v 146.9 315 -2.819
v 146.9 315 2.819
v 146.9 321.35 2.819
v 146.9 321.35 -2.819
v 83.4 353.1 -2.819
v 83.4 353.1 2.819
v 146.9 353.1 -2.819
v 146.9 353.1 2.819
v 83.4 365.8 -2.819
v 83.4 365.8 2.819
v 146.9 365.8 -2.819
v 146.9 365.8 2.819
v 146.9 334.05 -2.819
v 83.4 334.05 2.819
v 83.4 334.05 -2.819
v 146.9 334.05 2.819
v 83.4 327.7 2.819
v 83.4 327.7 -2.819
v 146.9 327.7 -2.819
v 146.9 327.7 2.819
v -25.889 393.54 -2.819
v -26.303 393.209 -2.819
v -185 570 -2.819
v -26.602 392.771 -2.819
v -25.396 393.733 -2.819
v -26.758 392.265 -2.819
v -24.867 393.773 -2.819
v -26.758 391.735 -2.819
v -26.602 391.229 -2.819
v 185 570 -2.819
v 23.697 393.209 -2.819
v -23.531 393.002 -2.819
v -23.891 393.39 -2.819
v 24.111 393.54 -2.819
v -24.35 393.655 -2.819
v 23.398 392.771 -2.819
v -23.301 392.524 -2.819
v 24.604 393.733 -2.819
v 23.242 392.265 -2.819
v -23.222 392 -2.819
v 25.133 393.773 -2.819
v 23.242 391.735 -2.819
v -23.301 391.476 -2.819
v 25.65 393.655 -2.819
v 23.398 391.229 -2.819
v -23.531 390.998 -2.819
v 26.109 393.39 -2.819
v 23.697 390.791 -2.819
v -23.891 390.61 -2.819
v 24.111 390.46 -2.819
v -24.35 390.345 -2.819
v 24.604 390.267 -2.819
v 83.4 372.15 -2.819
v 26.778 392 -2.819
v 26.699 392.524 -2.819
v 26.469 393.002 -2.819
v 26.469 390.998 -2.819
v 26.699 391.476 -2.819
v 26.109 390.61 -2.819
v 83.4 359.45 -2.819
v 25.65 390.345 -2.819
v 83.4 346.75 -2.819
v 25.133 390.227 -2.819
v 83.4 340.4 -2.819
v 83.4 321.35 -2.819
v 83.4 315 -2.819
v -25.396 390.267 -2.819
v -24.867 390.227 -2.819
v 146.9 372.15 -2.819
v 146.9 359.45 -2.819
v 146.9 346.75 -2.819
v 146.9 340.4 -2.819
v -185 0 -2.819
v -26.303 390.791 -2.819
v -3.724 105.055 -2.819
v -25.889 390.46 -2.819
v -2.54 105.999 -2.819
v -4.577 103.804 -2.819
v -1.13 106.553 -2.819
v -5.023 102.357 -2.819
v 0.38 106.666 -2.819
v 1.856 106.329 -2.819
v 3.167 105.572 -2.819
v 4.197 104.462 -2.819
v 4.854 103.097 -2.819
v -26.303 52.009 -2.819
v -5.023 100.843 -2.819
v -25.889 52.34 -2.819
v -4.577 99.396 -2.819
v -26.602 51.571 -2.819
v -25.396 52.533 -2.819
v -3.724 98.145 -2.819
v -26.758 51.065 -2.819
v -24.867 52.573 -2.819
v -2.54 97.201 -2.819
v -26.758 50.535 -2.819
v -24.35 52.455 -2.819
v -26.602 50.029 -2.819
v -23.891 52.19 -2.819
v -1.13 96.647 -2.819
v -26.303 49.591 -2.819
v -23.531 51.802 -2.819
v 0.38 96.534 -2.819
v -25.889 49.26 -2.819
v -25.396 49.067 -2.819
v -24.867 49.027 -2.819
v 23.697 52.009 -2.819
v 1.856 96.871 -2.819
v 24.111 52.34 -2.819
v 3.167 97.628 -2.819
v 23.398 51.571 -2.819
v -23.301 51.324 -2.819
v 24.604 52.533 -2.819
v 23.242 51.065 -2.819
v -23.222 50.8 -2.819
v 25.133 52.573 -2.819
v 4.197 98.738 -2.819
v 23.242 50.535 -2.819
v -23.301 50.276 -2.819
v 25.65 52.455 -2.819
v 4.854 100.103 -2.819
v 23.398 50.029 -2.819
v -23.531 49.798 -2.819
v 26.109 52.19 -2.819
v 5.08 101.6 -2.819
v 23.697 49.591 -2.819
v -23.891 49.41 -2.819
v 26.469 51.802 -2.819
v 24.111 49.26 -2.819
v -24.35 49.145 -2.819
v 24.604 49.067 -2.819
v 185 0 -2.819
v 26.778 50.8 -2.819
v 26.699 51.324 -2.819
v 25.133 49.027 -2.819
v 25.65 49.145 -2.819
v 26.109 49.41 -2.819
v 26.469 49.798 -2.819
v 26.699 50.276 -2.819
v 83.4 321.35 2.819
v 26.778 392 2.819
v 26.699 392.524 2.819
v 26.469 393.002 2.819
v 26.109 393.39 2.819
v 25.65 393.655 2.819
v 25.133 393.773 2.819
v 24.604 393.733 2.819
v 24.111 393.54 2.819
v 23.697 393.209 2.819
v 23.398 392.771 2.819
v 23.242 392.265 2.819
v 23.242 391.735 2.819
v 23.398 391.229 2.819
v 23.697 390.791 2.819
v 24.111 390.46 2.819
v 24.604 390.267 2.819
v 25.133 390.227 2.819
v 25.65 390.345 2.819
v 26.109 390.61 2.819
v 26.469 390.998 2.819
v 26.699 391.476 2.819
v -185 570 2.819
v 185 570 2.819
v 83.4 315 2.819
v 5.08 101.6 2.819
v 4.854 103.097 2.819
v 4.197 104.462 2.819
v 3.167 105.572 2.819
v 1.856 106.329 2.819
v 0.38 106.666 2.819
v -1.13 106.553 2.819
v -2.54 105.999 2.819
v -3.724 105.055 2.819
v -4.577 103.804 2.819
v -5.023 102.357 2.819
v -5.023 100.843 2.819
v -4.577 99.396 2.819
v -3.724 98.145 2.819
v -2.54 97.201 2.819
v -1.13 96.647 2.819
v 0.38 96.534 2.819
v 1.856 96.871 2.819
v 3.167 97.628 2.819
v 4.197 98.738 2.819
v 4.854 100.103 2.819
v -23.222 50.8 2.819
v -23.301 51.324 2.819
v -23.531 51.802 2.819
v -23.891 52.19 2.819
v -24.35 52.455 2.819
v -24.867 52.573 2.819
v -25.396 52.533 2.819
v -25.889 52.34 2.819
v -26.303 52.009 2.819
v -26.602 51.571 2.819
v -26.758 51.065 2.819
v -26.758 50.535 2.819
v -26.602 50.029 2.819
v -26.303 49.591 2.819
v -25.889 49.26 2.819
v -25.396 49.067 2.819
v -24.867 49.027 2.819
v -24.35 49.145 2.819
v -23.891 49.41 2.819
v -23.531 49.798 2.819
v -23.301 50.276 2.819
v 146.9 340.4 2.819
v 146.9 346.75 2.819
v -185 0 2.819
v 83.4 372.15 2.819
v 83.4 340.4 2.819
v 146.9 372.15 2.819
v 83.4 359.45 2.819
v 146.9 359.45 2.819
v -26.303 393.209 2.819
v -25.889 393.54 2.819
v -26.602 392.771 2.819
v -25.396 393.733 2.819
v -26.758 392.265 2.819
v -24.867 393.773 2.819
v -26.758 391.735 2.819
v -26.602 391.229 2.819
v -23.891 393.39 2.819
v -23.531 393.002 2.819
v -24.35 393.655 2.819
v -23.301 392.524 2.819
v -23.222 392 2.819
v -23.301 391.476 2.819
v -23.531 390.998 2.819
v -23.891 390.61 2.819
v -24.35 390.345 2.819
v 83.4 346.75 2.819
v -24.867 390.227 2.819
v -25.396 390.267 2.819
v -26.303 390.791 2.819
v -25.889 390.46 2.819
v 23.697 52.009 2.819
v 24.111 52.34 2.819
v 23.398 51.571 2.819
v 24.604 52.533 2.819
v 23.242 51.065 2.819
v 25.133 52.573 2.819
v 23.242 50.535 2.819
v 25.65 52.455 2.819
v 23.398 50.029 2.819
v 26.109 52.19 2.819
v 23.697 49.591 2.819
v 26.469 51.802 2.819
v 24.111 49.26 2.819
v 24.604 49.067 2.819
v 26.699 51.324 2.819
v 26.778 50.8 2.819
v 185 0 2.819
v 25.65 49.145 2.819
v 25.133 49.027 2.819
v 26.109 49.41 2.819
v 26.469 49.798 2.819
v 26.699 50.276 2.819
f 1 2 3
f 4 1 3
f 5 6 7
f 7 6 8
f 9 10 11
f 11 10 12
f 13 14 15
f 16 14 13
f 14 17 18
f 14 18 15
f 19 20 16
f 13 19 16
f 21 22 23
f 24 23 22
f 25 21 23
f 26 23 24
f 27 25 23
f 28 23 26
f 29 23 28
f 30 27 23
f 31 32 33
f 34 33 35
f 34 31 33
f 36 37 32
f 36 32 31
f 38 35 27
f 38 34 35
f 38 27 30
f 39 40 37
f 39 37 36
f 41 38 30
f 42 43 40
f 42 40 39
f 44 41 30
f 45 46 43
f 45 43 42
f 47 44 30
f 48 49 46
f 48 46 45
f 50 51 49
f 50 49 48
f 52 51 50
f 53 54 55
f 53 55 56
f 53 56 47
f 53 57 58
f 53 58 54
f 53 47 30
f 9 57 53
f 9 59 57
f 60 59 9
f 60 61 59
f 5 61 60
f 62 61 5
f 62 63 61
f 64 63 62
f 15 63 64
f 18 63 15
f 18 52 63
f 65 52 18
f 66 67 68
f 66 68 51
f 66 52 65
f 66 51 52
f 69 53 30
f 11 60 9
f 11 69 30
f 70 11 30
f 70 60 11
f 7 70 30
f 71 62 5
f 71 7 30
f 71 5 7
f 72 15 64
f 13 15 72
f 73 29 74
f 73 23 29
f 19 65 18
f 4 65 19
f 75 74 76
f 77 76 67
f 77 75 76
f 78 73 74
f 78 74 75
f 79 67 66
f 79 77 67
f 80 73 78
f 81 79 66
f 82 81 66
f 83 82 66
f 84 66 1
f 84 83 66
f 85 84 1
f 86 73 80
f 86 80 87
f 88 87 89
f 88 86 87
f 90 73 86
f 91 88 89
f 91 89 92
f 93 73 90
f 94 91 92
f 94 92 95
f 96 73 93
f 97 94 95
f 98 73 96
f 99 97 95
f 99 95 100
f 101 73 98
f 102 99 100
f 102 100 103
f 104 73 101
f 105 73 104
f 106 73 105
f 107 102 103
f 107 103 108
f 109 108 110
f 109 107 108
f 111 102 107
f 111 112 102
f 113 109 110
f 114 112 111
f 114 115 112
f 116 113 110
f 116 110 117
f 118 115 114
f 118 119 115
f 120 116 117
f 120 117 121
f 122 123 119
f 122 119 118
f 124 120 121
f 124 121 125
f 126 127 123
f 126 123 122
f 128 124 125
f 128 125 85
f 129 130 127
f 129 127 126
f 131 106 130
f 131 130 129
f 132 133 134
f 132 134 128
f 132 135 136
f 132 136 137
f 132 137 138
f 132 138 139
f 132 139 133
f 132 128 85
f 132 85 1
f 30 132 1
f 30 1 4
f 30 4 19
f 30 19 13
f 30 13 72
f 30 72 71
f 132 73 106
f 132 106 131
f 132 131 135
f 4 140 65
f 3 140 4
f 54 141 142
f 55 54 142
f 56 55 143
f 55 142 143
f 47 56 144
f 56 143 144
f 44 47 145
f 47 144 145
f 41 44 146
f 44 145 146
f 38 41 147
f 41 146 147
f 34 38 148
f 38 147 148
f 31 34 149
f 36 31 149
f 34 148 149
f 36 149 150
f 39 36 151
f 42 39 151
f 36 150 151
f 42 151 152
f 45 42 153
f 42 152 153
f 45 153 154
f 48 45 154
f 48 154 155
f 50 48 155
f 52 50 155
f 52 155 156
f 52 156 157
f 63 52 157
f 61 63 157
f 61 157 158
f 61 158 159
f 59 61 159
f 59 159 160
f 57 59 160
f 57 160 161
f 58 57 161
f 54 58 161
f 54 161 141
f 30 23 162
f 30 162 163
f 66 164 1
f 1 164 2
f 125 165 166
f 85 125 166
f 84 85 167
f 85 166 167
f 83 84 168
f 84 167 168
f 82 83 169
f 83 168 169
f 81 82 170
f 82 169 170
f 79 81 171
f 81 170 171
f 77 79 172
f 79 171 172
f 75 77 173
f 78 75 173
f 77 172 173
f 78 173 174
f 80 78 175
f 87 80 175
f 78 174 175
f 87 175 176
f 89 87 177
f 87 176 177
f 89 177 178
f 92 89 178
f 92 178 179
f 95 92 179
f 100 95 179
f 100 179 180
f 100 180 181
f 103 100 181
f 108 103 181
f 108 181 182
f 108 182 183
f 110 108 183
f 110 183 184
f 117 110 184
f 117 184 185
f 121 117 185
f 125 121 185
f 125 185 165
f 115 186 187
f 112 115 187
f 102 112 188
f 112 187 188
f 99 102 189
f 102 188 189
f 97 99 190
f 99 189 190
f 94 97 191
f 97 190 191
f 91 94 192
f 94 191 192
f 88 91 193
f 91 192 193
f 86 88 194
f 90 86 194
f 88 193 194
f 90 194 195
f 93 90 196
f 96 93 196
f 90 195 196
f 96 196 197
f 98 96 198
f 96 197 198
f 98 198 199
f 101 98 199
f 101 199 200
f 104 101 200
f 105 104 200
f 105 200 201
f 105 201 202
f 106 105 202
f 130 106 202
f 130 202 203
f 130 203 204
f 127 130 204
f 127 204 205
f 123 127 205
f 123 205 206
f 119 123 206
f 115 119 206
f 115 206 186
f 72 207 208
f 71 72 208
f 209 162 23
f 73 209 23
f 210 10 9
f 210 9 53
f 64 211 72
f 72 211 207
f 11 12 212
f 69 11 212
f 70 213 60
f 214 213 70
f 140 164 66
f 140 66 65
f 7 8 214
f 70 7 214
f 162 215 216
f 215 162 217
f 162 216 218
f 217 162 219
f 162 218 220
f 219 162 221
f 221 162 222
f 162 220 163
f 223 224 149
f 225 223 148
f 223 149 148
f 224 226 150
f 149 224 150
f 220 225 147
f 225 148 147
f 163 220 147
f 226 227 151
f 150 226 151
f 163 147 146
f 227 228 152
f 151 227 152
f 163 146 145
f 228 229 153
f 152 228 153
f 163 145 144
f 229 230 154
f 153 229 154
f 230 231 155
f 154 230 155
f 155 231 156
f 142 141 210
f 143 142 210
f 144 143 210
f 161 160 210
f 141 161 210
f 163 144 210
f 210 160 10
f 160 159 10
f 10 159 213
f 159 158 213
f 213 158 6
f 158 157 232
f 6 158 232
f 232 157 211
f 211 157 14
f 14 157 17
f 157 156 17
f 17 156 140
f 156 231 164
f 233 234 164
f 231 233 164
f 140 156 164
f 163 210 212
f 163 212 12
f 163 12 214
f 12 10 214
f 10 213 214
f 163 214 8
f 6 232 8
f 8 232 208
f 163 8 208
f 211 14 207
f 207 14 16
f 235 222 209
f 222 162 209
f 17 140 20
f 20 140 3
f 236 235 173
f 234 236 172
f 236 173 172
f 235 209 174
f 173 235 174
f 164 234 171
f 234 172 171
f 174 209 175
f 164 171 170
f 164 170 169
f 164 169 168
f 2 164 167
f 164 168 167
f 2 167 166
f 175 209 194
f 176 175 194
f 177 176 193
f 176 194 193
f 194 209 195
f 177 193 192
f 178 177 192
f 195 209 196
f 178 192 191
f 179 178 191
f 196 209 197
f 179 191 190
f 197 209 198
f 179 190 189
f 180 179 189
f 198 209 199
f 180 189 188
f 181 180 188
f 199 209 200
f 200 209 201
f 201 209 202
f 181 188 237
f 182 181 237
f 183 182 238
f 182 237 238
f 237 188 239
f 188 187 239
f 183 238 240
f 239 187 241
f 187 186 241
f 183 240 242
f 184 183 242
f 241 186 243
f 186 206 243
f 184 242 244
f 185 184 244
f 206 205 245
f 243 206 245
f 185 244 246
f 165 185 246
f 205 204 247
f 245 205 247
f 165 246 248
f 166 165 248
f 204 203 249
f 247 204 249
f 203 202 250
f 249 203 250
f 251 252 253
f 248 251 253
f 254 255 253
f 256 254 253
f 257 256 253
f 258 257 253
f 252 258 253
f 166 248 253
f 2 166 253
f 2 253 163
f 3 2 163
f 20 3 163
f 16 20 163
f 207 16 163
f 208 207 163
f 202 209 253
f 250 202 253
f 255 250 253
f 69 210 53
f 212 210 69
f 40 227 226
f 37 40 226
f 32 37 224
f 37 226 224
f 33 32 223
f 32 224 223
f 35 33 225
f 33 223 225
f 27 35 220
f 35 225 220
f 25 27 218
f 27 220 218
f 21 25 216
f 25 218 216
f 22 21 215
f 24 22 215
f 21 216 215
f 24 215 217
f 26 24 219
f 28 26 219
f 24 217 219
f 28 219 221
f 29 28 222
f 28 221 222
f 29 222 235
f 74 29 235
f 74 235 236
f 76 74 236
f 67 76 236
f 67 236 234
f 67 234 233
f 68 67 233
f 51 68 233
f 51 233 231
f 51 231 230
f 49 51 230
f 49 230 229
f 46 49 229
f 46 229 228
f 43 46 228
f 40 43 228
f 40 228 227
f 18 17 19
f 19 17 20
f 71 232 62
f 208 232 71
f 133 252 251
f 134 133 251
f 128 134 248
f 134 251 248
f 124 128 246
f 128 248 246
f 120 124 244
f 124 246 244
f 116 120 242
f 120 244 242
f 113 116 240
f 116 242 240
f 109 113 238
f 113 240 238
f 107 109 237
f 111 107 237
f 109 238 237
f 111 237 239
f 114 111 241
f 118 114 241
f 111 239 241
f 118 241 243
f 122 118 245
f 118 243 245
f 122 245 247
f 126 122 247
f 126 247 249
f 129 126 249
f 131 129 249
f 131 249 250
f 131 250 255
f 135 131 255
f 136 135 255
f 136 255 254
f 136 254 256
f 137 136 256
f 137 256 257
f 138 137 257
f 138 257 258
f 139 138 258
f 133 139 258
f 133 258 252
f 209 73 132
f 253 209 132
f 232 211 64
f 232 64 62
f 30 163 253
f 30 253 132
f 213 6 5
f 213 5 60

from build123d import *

# Parameters (mm, degrees)
SKETCH1_W           = 370
SKETCH1_H           = 5.6388
BOSS_EXTRUDE1_DEPTH = 570
SKETCH2_R           = 5.08
CUT_EXTRUDE1_DEPTH  = 6.6388
SKETCH3_R           = 1.778
CUT_EXTRUDE2_DEPTH  = 6.6388
SKETCH4_W           = 63.5
SKETCH4_H           = 6.35
CUT_EXTRUDE3_DEPTH  = 6.6388
LPATTERN1_COUNT     = 5
LPATTERN1_PITCH     = 12.7


with BuildPart() as part:
    # Sketch1 → Boss-Extrude1 (new body)
    with BuildSketch(Plane(origin=(0, 0, 0), x_dir=(1, 0, 0), z_dir=(0, 1, 0))):
        Rectangle(SKETCH1_W, SKETCH1_H)
    extrude(amount=BOSS_EXTRUDE1_DEPTH)

    # Sketch2 → Cut-Extrude1 (cut, through all)
    with BuildSketch(Plane.XY.offset(2.8194)):
        with Locations((0, 101.6)):
            Circle(SKETCH2_R)
    extrude(amount=-CUT_EXTRUDE1_DEPTH, mode=Mode.SUBTRACT)

    # Sketch3 → Cut-Extrude2 (cut, through all)
    with BuildSketch(Plane.XY.offset(2.8194)):
        with Locations((-25, 50.8)):
            Circle(SKETCH3_R)
        with Locations((25, 50.8)):
            Circle(SKETCH3_R)
        with Locations((-25, 392)):
            Circle(SKETCH3_R)
        with Locations((25, 392)):
            Circle(SKETCH3_R)
    extrude(amount=-CUT_EXTRUDE2_DEPTH, mode=Mode.SUBTRACT)

    # Sketch4 → Cut-Extrude3 (cut, through all)
    with BuildSketch(Plane.XY.offset(2.8194)):
        with Locations((115.15, 318.175)):
            Rectangle(SKETCH4_W, SKETCH4_H)
    cut_extrude3 = extrude(amount=-CUT_EXTRUDE3_DEPTH, mode=Mode.SUBTRACT)

    # LPattern1: Cut-Extrude3 ×5
    with Locations(*[(0, i * LPATTERN1_PITCH, 0) for i in range(1, LPATTERN1_COUNT)]):
        add(cut_extrude3, mode=Mode.SUBTRACT)


solid = part.part
